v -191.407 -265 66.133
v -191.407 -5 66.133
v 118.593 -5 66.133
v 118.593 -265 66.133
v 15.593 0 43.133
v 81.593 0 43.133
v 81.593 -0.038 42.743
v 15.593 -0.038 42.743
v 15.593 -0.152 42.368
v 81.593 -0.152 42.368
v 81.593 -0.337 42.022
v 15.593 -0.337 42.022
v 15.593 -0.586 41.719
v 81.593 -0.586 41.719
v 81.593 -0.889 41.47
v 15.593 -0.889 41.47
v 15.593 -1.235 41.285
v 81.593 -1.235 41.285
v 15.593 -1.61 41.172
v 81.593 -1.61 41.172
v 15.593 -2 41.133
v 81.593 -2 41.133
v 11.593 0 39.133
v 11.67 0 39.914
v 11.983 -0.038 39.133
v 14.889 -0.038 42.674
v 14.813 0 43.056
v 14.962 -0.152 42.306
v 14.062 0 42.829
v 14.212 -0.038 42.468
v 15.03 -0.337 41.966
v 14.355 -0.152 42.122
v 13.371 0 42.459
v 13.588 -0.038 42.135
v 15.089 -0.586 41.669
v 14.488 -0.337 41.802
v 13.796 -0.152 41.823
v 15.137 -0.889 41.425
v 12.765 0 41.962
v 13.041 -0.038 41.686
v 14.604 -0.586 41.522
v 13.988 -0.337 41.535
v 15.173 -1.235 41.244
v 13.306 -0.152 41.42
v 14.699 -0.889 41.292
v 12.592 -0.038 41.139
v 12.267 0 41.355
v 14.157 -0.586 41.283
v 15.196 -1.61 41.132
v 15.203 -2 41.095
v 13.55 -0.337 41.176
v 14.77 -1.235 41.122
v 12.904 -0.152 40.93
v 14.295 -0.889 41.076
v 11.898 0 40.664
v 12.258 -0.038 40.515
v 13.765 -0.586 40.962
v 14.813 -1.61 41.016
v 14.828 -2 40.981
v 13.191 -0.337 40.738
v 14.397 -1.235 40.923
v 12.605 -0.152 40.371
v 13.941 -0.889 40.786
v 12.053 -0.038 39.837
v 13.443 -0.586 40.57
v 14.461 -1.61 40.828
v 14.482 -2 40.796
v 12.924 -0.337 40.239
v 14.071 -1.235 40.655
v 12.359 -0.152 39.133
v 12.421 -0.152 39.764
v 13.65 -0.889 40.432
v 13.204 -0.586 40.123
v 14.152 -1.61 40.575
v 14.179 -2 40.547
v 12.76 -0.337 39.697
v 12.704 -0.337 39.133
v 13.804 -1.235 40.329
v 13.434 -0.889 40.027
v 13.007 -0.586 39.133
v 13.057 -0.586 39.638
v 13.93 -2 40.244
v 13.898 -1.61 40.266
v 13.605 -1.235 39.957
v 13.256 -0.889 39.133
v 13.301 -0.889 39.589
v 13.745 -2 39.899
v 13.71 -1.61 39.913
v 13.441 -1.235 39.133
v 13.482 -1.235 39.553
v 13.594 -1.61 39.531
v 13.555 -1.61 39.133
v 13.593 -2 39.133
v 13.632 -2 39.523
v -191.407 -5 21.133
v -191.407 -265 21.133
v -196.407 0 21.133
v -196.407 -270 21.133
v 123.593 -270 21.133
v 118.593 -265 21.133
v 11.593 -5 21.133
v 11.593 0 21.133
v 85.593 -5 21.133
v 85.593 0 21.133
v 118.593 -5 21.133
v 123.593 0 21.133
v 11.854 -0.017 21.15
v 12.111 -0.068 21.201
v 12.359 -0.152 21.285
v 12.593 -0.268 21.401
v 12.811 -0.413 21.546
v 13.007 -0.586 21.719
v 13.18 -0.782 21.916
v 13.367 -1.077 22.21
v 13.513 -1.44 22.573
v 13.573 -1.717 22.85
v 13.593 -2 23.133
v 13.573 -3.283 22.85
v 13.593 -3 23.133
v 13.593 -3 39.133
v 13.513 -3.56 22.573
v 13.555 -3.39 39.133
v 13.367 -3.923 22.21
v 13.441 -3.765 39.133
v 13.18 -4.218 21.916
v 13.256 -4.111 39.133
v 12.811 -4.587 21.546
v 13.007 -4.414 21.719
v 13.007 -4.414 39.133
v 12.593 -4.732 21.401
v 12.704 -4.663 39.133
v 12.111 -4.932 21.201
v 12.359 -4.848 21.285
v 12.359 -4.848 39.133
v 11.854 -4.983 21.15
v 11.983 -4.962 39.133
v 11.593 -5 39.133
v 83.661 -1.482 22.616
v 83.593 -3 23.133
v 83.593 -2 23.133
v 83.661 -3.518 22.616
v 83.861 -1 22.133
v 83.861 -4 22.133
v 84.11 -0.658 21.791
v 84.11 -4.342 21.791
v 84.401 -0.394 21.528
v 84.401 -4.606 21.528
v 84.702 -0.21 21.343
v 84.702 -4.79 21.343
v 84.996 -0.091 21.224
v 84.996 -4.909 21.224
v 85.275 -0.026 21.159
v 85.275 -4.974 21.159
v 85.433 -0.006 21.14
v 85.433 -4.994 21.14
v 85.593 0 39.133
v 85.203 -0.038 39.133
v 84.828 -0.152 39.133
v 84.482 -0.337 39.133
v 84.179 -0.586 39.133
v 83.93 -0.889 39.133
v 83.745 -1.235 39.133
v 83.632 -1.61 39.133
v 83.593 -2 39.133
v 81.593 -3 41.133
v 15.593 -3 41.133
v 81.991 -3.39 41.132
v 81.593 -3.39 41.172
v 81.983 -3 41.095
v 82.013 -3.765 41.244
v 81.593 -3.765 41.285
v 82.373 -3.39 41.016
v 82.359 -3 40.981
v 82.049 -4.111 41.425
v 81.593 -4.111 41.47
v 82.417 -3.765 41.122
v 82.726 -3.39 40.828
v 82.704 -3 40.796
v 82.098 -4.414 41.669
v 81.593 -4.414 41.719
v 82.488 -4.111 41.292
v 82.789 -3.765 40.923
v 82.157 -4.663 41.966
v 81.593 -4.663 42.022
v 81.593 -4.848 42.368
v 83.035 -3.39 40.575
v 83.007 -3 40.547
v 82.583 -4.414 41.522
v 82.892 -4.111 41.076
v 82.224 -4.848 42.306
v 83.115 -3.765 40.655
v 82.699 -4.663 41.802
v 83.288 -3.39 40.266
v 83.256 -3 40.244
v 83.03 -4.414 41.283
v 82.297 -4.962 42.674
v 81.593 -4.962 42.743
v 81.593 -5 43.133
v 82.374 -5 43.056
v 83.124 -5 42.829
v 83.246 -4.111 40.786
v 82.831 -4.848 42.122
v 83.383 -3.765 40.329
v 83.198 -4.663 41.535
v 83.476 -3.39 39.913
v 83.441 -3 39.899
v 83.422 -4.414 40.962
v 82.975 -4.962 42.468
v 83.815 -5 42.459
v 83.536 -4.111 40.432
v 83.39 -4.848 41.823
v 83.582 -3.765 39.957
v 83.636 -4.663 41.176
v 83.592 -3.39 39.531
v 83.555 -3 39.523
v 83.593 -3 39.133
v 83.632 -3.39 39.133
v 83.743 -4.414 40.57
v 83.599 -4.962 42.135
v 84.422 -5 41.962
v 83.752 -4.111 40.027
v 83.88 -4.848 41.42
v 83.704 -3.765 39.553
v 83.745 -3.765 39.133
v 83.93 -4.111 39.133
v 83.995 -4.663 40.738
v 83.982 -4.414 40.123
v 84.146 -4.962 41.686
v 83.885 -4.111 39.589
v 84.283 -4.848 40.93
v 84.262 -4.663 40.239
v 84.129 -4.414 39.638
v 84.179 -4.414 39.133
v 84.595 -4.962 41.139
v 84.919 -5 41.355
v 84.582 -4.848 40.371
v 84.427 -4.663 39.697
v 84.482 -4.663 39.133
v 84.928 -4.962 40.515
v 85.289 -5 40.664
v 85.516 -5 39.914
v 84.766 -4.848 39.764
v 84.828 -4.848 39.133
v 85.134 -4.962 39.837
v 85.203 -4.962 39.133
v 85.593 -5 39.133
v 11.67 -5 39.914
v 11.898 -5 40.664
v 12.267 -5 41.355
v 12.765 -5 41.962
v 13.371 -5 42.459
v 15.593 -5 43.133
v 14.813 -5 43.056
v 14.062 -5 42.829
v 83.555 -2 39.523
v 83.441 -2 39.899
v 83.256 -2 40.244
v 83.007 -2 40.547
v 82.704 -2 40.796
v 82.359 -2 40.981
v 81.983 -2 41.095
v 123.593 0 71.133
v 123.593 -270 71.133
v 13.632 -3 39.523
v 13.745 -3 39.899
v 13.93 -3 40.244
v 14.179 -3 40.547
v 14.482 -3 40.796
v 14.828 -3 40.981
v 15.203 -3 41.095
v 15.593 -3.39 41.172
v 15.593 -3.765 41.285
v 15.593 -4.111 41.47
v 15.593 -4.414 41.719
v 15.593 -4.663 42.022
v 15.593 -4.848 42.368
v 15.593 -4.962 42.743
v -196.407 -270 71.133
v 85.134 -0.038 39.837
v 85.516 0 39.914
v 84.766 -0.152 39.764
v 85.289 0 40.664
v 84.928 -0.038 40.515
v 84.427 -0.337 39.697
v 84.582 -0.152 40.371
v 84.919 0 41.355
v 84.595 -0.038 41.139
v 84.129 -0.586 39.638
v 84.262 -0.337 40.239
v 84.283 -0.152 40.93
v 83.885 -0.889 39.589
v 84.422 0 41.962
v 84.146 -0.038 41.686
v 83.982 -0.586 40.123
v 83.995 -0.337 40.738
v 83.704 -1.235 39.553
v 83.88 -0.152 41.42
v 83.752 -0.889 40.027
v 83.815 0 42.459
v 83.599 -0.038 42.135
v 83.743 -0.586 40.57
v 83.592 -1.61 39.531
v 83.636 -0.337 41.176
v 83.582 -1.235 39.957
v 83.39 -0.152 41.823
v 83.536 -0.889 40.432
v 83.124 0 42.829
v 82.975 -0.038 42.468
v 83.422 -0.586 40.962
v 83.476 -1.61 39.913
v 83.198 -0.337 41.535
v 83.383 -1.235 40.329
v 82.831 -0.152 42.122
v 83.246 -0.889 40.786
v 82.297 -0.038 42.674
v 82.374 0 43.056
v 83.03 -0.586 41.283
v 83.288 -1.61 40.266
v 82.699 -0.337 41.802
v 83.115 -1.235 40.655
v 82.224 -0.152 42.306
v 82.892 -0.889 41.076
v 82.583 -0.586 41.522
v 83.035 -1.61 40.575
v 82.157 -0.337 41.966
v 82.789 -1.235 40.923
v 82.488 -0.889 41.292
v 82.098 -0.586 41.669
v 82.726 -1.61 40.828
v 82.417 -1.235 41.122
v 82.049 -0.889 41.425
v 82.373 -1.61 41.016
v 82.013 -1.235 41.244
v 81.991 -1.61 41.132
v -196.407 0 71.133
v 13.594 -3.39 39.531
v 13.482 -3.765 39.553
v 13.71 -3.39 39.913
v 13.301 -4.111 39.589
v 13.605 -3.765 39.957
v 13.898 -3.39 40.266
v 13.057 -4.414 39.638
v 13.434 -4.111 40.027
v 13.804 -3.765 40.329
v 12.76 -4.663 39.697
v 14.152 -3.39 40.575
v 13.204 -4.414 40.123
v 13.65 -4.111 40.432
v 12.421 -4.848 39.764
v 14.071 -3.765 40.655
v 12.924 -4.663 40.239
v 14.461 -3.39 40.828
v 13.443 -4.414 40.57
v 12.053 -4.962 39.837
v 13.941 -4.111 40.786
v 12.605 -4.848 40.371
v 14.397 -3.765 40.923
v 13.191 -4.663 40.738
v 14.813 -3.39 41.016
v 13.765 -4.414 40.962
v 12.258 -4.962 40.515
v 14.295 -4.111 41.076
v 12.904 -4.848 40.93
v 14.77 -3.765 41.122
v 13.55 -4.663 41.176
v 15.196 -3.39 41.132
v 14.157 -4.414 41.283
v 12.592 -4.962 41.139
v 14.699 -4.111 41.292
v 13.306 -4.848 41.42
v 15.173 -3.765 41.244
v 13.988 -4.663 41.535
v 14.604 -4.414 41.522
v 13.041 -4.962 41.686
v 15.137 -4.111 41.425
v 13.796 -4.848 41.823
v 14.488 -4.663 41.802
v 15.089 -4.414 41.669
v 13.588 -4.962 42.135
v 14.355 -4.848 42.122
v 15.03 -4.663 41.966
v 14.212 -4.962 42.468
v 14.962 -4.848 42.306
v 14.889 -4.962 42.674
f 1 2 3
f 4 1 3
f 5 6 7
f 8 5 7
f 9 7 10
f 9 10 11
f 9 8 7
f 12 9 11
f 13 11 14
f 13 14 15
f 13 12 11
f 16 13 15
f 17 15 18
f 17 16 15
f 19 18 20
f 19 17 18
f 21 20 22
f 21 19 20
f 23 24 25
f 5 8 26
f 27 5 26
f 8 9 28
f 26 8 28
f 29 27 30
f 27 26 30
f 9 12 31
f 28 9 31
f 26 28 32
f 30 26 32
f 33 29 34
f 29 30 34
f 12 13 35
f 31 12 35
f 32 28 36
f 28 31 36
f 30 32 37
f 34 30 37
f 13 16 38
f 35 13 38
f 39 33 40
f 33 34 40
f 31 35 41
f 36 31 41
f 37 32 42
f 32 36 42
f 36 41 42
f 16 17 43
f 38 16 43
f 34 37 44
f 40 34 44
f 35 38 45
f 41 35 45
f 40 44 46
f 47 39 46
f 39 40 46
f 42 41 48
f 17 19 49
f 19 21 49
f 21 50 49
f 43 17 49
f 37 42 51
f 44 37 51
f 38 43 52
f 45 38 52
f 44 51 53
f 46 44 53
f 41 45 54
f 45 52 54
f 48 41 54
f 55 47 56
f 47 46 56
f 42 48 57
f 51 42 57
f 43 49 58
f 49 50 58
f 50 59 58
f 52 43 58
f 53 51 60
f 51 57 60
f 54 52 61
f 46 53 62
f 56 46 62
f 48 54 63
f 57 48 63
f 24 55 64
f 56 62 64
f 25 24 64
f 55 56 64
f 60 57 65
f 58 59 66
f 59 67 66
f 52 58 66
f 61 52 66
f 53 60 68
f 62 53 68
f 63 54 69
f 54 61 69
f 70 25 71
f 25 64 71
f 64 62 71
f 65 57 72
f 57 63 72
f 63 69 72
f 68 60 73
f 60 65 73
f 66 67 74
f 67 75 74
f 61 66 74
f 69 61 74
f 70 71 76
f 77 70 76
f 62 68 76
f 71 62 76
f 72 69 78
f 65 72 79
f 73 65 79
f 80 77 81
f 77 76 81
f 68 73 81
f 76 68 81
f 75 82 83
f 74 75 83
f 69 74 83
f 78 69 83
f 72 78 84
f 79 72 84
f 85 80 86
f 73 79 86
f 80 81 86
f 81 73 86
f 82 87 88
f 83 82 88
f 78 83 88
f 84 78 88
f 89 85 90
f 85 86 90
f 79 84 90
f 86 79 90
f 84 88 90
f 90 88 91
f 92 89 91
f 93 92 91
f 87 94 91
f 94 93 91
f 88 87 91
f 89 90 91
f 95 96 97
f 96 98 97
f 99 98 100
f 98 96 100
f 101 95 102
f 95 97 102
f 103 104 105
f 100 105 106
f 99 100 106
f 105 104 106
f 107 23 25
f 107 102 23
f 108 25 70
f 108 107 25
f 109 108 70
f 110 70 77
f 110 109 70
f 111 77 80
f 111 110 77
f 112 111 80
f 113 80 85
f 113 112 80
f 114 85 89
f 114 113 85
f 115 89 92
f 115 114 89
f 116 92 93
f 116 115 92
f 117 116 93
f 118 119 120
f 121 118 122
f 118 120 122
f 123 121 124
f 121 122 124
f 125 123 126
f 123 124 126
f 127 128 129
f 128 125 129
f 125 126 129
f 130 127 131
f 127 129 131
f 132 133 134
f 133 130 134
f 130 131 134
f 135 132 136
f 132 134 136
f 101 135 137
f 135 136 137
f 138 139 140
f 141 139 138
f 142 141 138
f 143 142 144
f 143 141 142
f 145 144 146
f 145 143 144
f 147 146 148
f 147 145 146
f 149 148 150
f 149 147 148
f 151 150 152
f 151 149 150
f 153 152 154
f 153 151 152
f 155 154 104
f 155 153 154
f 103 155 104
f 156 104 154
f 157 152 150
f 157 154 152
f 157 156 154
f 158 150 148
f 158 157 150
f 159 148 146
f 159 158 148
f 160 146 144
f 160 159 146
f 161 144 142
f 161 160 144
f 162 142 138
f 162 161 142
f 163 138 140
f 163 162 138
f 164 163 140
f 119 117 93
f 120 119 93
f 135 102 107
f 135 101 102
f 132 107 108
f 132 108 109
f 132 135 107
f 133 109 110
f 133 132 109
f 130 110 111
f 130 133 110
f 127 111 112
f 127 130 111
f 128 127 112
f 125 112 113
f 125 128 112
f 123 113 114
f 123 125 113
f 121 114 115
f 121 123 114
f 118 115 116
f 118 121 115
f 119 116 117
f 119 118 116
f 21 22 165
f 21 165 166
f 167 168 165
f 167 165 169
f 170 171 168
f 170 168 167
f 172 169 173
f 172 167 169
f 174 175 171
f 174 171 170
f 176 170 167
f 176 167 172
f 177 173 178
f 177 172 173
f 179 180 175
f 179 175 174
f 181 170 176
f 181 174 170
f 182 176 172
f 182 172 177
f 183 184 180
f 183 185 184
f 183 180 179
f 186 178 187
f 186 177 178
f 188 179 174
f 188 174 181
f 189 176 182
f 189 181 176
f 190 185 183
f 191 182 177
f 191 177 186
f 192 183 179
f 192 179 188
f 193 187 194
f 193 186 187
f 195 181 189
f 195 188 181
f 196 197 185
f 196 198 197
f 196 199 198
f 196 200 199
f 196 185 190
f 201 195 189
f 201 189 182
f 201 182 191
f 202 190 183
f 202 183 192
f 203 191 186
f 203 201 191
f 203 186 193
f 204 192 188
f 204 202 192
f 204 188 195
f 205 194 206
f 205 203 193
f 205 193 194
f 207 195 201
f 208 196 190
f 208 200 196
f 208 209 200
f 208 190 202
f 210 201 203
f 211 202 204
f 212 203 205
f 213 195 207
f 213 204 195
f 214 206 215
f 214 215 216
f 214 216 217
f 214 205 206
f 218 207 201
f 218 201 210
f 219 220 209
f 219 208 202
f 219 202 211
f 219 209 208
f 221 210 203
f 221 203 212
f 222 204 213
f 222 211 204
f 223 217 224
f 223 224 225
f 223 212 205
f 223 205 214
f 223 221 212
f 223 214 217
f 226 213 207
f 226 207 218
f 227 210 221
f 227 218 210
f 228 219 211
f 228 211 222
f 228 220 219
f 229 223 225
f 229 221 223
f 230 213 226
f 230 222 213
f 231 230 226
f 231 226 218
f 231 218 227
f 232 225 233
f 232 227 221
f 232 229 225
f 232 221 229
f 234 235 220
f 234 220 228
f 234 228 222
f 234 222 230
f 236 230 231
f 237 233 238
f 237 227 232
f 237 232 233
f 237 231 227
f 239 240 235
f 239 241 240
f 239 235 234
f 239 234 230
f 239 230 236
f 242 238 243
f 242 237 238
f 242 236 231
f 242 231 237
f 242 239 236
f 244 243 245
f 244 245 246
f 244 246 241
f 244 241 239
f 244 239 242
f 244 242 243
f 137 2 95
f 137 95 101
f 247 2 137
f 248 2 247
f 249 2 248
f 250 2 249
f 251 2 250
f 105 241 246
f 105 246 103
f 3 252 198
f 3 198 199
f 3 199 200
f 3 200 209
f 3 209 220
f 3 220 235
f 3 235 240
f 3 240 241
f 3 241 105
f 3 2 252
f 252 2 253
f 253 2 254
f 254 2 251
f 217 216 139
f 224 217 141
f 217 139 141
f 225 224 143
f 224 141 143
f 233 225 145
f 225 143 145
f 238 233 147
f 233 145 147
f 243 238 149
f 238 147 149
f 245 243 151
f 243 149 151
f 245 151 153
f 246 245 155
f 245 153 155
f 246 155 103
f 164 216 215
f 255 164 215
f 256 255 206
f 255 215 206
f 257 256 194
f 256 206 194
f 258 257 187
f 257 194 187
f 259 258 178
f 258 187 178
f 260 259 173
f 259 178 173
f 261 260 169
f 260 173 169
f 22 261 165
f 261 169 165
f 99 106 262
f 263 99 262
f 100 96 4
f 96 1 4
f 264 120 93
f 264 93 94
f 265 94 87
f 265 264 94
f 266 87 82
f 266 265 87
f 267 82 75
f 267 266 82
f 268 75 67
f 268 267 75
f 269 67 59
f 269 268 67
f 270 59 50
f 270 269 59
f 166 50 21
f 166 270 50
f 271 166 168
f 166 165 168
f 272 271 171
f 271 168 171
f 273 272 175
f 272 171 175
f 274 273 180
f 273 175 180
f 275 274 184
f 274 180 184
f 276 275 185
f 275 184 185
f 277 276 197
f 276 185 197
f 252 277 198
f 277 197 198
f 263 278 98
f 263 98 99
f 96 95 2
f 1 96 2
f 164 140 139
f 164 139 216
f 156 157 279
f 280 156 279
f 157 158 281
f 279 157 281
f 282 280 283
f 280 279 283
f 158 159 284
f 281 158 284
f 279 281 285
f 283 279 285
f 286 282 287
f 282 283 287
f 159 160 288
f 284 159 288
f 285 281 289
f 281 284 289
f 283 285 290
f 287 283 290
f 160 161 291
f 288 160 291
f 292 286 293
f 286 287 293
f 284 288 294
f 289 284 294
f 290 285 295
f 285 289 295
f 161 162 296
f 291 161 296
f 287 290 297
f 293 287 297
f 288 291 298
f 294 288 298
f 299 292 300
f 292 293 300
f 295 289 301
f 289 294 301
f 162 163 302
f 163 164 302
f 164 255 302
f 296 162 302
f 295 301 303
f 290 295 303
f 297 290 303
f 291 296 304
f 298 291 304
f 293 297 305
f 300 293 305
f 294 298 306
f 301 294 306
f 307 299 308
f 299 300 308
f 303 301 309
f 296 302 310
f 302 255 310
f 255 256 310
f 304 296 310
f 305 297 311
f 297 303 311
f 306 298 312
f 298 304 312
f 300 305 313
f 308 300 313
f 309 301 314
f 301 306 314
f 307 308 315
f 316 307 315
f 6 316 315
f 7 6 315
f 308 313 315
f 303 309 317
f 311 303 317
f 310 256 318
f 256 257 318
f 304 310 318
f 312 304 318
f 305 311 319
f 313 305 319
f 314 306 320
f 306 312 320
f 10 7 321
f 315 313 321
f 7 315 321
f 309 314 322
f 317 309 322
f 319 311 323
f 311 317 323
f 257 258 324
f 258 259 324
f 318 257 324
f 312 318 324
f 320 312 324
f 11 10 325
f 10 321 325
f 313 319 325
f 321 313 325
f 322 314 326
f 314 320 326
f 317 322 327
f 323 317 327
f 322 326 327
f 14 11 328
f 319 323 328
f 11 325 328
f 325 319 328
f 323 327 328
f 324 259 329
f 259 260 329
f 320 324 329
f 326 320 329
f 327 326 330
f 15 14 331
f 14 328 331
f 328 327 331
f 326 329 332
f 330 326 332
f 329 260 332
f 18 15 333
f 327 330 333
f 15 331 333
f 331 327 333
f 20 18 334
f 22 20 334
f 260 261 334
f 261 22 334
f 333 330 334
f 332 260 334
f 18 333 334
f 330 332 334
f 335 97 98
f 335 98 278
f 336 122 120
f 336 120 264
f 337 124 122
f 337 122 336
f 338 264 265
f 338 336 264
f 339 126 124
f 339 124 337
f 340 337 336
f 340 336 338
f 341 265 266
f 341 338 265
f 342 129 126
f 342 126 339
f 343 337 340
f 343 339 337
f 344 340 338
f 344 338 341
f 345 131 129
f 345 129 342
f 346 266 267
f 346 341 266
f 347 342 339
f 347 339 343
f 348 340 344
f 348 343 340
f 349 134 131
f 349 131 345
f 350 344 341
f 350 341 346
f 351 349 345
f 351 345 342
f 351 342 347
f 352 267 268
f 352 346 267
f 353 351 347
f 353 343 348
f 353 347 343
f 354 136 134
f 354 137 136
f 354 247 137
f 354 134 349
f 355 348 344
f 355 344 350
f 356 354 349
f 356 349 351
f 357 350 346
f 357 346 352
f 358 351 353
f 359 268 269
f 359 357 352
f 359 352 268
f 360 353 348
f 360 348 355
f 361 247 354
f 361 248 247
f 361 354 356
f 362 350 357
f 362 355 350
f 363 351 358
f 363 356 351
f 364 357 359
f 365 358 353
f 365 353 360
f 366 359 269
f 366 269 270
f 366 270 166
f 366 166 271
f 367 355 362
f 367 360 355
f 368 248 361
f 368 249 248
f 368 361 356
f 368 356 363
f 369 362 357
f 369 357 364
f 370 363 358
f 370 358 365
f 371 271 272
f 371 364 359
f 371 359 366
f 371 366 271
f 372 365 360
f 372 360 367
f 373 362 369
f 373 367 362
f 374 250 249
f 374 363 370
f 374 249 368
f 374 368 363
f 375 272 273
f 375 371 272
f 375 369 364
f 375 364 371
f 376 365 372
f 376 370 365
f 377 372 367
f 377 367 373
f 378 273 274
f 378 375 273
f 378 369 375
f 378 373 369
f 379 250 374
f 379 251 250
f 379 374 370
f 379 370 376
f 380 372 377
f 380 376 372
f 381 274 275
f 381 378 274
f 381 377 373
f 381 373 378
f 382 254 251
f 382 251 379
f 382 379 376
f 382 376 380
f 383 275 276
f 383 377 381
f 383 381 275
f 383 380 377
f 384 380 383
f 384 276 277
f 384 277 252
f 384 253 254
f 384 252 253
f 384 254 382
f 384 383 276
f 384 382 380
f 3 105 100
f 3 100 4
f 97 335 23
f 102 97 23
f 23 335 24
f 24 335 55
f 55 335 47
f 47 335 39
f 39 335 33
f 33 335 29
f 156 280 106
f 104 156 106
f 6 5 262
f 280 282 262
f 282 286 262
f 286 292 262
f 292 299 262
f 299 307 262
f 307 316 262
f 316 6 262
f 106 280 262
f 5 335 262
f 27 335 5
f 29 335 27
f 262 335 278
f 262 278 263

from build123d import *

# Parameters (mm, degrees)
F0_W     = 320
F0_H     = 50
F1_DEPTH = 270
F2_T     = -5
F3_W     = 70
F3_H     = 20
F4_DEPTH = 25
F5_F1_R  = 2
F5_F2_R  = 2


with BuildPart() as f1:
    # F0 (on Front) → F1 (new body)
    with BuildSketch(Plane.XZ):
        with Locations((-36.4068159834, 46.1331414707)):
            Rectangle(F0_W, F0_H)
    extrude(amount=F1_DEPTH)

    # F2
    f2_openings = [f1.faces().sort_by_distance(p)[0] for p in [
        (-36.406816, -135, 21.133141),
    ]]
    offset(amount=F2_T, openings=f2_openings)

    # F3 (on face) → F4 (cut)
    with BuildSketch(Plane(origin=(0, 0, 0), x_dir=(-1, 0, 0), z_dir=(0, 1, 0))):
        with Locations((-48.5931840166, 31.1331414707)):
            Rectangle(F3_W, F3_H)
    extrude(amount=-F4_DEPTH, mode=Mode.SUBTRACT)

    # F5: fillet of radius 2 on 6 edges, made by hand

    # F5_f1
    f5_f1_edges = [f1.edges().sort_by_distance(p)[0] for p in [
        (83.5931840166, -2.5, 41.1331414707),
        (13.5931840166, -2.5, 41.1331414707),
    ]]
    fillet(f5_f1_edges, radius=F5_F1_R)

    # F5_f2
    f5_f2_edges = [f1.edges().sort_by_distance(p)[0] for p in [
        (83.5931840166, -2.5, 21.1331414707),
        (13.5931840166, -2.5, 21.1331414707),
        (48.5931840166, 0, 41.1331414707),
        (48.5931840166, -5, 41.1331414707),
        (83.007397579, -5, 40.5473550331),
        (14.1789704543, -5, 40.5473550331),
        (14.1789704543, 0, 40.5473550331),
        (83.007397579, 0, 40.5473550331),
    ]]
    fillet(f5_f2_edges, radius=F5_F2_R)


solid = f1.part
